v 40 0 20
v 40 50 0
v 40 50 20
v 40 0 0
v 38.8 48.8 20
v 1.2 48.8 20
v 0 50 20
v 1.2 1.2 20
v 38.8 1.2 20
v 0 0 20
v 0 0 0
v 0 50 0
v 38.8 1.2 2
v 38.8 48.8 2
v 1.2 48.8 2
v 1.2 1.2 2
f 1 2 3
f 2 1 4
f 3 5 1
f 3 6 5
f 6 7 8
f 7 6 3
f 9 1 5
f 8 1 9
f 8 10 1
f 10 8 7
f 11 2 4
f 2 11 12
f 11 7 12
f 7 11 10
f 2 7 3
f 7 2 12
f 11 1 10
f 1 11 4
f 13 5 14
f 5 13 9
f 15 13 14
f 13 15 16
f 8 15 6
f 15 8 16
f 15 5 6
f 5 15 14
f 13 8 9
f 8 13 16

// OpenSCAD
$fn = 32;

// ----------------------------------------------------------------------
// Open box: 1.2 mm walls
// ----------------------------------------------------------------------

// --- parameters (mm) ---
box_l = 40;               // outer length, X
box_w = 50;               // outer width, Y
box_h = 20;               // outer height, Z
wall = 1.2;               // wall thickness
floor = 2;                // floor thickness

difference() {
  cube([box_l, box_w, box_h]);
  translate([wall, wall, floor])
    cube([box_l - 2 * wall, box_w - 2 * wall, box_h]);
}
